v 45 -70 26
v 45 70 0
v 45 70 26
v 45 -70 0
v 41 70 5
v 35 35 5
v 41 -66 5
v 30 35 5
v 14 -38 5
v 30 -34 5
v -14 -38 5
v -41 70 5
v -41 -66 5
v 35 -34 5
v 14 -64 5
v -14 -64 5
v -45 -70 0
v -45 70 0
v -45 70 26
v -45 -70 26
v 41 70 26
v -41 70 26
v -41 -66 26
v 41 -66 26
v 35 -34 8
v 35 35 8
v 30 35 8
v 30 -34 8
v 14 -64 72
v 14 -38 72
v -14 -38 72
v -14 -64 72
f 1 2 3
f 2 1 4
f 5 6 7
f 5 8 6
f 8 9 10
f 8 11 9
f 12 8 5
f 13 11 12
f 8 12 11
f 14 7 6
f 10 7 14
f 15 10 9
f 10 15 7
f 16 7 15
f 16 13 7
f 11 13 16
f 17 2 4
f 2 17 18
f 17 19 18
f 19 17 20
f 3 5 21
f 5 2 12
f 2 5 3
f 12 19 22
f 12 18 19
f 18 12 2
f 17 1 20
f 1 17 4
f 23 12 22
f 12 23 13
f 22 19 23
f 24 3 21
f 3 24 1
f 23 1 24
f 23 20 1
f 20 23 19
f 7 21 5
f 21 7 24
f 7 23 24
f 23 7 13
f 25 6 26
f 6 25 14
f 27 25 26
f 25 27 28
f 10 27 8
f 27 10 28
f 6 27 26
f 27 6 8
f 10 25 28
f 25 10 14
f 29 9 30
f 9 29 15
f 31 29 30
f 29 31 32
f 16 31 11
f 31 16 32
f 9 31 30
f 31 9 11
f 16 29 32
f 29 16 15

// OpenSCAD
// Dimensions in millimetres. Choose a part in the Customizer.
part = "housing";

if (part == "housing") union() {
    translate([-45, -70, 0]) cube([90, 140, 5]);
    translate([-45, -70, 5]) cube([4, 140, 21]);
    translate([41, -70, 5]) cube([4, 140, 21]);
    translate([-41, -70, 5]) cube([82, 4, 21]);
    translate([30, -34, 5]) cube([5, 69, 3]);
    translate([-14, -64, 4]) cube([28, 26, 68]);
}

if (part == "catch_cup") union() {
    translate([-64, -54, 0]) cube([128, 108, 4]);
    translate([-64, -54, 4]) cube([4, 108, 31]);
    translate([60, -54, 4]) cube([4, 108, 31]);
    translate([-60, -54, 4]) cube([120, 4, 19]);
    translate([-60, 50, 4]) cube([120, 4, 31]);
}

if (part == "sweeping_tool") union() {
    translate([-12.5, -41, 0]) cube([25, 74, 6]);
    translate([-12, -34, 6]) cube([24, 25, 44]);
    translate([-12.5, 31, 0]) cube([25, 16, 11]);
}

if (part == "chip_01") union() {
    translate([-3, -3, -2]) cube([6, 6, 4]);
}
